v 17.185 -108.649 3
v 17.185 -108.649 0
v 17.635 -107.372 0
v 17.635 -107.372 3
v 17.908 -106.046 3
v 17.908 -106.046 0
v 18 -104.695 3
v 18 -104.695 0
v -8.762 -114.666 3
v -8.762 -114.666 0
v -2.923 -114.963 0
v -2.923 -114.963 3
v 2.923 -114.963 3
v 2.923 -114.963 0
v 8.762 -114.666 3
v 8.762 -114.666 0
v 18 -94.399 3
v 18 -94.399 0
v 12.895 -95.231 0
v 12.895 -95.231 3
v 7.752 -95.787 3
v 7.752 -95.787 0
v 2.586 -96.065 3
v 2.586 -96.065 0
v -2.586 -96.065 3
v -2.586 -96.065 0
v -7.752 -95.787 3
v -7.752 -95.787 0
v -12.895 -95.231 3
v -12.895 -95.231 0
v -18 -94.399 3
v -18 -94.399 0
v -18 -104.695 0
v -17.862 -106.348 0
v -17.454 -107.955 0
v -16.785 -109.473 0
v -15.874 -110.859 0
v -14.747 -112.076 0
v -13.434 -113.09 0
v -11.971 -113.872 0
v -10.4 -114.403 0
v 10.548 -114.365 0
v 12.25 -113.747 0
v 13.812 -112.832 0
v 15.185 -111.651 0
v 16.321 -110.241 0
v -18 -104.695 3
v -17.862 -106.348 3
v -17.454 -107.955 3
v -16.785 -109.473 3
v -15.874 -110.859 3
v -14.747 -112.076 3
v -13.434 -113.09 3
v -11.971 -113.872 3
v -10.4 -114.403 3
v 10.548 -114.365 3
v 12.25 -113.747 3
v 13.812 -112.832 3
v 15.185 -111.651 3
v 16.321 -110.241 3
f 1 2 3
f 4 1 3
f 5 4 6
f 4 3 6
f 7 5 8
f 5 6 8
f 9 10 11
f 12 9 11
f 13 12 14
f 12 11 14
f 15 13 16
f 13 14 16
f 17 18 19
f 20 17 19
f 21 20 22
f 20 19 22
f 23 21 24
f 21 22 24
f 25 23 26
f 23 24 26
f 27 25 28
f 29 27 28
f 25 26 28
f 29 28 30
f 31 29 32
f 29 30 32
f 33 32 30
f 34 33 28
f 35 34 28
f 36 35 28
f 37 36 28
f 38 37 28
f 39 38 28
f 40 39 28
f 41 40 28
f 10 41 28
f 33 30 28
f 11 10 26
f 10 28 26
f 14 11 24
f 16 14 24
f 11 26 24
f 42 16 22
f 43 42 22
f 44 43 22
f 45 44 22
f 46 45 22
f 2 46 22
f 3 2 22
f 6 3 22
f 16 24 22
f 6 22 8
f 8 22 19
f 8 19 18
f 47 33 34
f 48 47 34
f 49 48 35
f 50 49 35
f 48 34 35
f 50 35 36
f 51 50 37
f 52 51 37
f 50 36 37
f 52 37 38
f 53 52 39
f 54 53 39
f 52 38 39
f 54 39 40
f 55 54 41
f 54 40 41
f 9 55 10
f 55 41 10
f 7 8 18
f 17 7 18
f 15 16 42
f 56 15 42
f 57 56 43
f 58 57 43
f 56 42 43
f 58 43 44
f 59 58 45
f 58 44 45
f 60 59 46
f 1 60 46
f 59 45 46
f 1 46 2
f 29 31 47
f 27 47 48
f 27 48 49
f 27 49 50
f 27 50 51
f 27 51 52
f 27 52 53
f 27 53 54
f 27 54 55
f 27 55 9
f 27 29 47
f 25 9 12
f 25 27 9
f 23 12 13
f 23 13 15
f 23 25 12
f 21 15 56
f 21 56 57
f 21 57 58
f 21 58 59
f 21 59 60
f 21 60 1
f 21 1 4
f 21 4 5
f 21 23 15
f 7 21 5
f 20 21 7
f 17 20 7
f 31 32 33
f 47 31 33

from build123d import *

# Parameters (mm, degrees)
BOSS_EXTRUDE1_DEPTH = 3


with BuildPart() as part:
    # Sketch2 → Boss-Extrude1 (new body)
    with BuildSketch(Plane.XY):
        with BuildLine():
            Line((18, -104.694794522), (18, -94.399205505))
            ThreePointArc((18, -94.399205505), (0, -96.1), (-18, -94.399205505))
            Line((-18, -94.399205505), (-18, -104.694794522))
            ThreePointArc((-18, -104.694794522), (-15.335497516, -111.49115209), (-8.761904762, -114.665727334))
            ThreePointArc((-8.761904762, -114.665727334), (0, -115), (8.761904762, -114.665727334))
            ThreePointArc((8.761904762, -114.665727334), (13.812374448, -112.832134584), (17.184851944, -108.649348197))
            ThreePointArc((17.184851944, -108.649348197), (17.794093103, -106.713640797), (18, -104.694794522))
        make_face()
    extrude(amount=BOSS_EXTRUDE1_DEPTH)


solid = part.part
